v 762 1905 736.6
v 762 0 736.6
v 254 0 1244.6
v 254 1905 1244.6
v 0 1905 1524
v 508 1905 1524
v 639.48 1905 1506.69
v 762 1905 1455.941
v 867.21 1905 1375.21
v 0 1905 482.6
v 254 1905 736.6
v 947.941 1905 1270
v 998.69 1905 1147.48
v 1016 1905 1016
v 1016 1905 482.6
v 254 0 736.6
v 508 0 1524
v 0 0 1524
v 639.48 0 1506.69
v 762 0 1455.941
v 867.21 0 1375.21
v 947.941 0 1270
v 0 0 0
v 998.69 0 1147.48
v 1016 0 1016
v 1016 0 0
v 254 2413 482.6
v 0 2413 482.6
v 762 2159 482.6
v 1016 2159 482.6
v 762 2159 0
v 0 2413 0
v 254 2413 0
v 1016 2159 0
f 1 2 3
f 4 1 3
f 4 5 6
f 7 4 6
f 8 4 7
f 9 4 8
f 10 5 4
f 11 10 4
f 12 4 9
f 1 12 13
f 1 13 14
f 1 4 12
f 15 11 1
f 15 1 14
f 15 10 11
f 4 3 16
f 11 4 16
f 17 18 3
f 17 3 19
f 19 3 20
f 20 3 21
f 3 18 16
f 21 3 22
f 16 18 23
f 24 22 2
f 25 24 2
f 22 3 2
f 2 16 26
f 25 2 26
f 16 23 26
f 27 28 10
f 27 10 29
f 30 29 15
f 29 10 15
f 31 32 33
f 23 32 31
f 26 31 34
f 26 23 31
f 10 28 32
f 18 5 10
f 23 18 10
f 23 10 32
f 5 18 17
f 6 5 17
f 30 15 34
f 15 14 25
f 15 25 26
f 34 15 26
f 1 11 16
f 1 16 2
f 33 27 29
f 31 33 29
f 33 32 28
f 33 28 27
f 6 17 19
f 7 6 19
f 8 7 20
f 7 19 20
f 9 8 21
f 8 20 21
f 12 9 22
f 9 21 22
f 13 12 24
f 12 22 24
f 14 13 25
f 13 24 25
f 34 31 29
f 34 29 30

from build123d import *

# Parameters (mm, degrees)
BOSS_EXTRUDE1_DEPTH = 1905
SKETCH1_3_W         = 1016
SKETCH1_3_H         = 482.6
BOSS_EXTRUDE2_DEPTH = 2413
CUT_EXTRUDE1_DEPTH  = 482.6


with BuildPart() as part:
    # Sketch1 → Boss-Extrude1 (new body)
    with BuildSketch(Plane(origin=(0, 0, 0), x_dir=(1, 0, 0), z_dir=(0, 1, 0))):
        with BuildLine():
            Line((1016, -482.6), (0, -482.6))
            Line((0, -482.6), (0, -1524))
            Line((0, -1524), (508, -1524))
            ThreePointArc((508, -1524), (867.210244843, -1375.210244843), (1016, -1016))
            Line((1016, -1016), (1016, -482.6))
        make_face()
        Polygon((254, -1244.6), (254, -736.6), (762, -736.6), align=None, mode=Mode.SUBTRACT)
    extrude(amount=BOSS_EXTRUDE1_DEPTH)

    # Sketch1<3> → Boss-Extrude2 (add)
    with BuildSketch(Plane(origin=(0, 0, 0), x_dir=(1, 0, 0), z_dir=(0, 1, 0))):
        with Locations((508, -241.3)):
            Rectangle(SKETCH1_3_W, SKETCH1_3_H)
    extrude(amount=BOSS_EXTRUDE2_DEPTH)

    # Sketch2 → Cut-Extrude1 (cut)
    with BuildSketch(Plane.XY.offset(482.6)):
        Polygon((254, 2413), (762, 2159), (1016, 2159), (1016, 2413), align=None)
    extrude(amount=-CUT_EXTRUDE1_DEPTH, mode=Mode.SUBTRACT)


solid = part.part
